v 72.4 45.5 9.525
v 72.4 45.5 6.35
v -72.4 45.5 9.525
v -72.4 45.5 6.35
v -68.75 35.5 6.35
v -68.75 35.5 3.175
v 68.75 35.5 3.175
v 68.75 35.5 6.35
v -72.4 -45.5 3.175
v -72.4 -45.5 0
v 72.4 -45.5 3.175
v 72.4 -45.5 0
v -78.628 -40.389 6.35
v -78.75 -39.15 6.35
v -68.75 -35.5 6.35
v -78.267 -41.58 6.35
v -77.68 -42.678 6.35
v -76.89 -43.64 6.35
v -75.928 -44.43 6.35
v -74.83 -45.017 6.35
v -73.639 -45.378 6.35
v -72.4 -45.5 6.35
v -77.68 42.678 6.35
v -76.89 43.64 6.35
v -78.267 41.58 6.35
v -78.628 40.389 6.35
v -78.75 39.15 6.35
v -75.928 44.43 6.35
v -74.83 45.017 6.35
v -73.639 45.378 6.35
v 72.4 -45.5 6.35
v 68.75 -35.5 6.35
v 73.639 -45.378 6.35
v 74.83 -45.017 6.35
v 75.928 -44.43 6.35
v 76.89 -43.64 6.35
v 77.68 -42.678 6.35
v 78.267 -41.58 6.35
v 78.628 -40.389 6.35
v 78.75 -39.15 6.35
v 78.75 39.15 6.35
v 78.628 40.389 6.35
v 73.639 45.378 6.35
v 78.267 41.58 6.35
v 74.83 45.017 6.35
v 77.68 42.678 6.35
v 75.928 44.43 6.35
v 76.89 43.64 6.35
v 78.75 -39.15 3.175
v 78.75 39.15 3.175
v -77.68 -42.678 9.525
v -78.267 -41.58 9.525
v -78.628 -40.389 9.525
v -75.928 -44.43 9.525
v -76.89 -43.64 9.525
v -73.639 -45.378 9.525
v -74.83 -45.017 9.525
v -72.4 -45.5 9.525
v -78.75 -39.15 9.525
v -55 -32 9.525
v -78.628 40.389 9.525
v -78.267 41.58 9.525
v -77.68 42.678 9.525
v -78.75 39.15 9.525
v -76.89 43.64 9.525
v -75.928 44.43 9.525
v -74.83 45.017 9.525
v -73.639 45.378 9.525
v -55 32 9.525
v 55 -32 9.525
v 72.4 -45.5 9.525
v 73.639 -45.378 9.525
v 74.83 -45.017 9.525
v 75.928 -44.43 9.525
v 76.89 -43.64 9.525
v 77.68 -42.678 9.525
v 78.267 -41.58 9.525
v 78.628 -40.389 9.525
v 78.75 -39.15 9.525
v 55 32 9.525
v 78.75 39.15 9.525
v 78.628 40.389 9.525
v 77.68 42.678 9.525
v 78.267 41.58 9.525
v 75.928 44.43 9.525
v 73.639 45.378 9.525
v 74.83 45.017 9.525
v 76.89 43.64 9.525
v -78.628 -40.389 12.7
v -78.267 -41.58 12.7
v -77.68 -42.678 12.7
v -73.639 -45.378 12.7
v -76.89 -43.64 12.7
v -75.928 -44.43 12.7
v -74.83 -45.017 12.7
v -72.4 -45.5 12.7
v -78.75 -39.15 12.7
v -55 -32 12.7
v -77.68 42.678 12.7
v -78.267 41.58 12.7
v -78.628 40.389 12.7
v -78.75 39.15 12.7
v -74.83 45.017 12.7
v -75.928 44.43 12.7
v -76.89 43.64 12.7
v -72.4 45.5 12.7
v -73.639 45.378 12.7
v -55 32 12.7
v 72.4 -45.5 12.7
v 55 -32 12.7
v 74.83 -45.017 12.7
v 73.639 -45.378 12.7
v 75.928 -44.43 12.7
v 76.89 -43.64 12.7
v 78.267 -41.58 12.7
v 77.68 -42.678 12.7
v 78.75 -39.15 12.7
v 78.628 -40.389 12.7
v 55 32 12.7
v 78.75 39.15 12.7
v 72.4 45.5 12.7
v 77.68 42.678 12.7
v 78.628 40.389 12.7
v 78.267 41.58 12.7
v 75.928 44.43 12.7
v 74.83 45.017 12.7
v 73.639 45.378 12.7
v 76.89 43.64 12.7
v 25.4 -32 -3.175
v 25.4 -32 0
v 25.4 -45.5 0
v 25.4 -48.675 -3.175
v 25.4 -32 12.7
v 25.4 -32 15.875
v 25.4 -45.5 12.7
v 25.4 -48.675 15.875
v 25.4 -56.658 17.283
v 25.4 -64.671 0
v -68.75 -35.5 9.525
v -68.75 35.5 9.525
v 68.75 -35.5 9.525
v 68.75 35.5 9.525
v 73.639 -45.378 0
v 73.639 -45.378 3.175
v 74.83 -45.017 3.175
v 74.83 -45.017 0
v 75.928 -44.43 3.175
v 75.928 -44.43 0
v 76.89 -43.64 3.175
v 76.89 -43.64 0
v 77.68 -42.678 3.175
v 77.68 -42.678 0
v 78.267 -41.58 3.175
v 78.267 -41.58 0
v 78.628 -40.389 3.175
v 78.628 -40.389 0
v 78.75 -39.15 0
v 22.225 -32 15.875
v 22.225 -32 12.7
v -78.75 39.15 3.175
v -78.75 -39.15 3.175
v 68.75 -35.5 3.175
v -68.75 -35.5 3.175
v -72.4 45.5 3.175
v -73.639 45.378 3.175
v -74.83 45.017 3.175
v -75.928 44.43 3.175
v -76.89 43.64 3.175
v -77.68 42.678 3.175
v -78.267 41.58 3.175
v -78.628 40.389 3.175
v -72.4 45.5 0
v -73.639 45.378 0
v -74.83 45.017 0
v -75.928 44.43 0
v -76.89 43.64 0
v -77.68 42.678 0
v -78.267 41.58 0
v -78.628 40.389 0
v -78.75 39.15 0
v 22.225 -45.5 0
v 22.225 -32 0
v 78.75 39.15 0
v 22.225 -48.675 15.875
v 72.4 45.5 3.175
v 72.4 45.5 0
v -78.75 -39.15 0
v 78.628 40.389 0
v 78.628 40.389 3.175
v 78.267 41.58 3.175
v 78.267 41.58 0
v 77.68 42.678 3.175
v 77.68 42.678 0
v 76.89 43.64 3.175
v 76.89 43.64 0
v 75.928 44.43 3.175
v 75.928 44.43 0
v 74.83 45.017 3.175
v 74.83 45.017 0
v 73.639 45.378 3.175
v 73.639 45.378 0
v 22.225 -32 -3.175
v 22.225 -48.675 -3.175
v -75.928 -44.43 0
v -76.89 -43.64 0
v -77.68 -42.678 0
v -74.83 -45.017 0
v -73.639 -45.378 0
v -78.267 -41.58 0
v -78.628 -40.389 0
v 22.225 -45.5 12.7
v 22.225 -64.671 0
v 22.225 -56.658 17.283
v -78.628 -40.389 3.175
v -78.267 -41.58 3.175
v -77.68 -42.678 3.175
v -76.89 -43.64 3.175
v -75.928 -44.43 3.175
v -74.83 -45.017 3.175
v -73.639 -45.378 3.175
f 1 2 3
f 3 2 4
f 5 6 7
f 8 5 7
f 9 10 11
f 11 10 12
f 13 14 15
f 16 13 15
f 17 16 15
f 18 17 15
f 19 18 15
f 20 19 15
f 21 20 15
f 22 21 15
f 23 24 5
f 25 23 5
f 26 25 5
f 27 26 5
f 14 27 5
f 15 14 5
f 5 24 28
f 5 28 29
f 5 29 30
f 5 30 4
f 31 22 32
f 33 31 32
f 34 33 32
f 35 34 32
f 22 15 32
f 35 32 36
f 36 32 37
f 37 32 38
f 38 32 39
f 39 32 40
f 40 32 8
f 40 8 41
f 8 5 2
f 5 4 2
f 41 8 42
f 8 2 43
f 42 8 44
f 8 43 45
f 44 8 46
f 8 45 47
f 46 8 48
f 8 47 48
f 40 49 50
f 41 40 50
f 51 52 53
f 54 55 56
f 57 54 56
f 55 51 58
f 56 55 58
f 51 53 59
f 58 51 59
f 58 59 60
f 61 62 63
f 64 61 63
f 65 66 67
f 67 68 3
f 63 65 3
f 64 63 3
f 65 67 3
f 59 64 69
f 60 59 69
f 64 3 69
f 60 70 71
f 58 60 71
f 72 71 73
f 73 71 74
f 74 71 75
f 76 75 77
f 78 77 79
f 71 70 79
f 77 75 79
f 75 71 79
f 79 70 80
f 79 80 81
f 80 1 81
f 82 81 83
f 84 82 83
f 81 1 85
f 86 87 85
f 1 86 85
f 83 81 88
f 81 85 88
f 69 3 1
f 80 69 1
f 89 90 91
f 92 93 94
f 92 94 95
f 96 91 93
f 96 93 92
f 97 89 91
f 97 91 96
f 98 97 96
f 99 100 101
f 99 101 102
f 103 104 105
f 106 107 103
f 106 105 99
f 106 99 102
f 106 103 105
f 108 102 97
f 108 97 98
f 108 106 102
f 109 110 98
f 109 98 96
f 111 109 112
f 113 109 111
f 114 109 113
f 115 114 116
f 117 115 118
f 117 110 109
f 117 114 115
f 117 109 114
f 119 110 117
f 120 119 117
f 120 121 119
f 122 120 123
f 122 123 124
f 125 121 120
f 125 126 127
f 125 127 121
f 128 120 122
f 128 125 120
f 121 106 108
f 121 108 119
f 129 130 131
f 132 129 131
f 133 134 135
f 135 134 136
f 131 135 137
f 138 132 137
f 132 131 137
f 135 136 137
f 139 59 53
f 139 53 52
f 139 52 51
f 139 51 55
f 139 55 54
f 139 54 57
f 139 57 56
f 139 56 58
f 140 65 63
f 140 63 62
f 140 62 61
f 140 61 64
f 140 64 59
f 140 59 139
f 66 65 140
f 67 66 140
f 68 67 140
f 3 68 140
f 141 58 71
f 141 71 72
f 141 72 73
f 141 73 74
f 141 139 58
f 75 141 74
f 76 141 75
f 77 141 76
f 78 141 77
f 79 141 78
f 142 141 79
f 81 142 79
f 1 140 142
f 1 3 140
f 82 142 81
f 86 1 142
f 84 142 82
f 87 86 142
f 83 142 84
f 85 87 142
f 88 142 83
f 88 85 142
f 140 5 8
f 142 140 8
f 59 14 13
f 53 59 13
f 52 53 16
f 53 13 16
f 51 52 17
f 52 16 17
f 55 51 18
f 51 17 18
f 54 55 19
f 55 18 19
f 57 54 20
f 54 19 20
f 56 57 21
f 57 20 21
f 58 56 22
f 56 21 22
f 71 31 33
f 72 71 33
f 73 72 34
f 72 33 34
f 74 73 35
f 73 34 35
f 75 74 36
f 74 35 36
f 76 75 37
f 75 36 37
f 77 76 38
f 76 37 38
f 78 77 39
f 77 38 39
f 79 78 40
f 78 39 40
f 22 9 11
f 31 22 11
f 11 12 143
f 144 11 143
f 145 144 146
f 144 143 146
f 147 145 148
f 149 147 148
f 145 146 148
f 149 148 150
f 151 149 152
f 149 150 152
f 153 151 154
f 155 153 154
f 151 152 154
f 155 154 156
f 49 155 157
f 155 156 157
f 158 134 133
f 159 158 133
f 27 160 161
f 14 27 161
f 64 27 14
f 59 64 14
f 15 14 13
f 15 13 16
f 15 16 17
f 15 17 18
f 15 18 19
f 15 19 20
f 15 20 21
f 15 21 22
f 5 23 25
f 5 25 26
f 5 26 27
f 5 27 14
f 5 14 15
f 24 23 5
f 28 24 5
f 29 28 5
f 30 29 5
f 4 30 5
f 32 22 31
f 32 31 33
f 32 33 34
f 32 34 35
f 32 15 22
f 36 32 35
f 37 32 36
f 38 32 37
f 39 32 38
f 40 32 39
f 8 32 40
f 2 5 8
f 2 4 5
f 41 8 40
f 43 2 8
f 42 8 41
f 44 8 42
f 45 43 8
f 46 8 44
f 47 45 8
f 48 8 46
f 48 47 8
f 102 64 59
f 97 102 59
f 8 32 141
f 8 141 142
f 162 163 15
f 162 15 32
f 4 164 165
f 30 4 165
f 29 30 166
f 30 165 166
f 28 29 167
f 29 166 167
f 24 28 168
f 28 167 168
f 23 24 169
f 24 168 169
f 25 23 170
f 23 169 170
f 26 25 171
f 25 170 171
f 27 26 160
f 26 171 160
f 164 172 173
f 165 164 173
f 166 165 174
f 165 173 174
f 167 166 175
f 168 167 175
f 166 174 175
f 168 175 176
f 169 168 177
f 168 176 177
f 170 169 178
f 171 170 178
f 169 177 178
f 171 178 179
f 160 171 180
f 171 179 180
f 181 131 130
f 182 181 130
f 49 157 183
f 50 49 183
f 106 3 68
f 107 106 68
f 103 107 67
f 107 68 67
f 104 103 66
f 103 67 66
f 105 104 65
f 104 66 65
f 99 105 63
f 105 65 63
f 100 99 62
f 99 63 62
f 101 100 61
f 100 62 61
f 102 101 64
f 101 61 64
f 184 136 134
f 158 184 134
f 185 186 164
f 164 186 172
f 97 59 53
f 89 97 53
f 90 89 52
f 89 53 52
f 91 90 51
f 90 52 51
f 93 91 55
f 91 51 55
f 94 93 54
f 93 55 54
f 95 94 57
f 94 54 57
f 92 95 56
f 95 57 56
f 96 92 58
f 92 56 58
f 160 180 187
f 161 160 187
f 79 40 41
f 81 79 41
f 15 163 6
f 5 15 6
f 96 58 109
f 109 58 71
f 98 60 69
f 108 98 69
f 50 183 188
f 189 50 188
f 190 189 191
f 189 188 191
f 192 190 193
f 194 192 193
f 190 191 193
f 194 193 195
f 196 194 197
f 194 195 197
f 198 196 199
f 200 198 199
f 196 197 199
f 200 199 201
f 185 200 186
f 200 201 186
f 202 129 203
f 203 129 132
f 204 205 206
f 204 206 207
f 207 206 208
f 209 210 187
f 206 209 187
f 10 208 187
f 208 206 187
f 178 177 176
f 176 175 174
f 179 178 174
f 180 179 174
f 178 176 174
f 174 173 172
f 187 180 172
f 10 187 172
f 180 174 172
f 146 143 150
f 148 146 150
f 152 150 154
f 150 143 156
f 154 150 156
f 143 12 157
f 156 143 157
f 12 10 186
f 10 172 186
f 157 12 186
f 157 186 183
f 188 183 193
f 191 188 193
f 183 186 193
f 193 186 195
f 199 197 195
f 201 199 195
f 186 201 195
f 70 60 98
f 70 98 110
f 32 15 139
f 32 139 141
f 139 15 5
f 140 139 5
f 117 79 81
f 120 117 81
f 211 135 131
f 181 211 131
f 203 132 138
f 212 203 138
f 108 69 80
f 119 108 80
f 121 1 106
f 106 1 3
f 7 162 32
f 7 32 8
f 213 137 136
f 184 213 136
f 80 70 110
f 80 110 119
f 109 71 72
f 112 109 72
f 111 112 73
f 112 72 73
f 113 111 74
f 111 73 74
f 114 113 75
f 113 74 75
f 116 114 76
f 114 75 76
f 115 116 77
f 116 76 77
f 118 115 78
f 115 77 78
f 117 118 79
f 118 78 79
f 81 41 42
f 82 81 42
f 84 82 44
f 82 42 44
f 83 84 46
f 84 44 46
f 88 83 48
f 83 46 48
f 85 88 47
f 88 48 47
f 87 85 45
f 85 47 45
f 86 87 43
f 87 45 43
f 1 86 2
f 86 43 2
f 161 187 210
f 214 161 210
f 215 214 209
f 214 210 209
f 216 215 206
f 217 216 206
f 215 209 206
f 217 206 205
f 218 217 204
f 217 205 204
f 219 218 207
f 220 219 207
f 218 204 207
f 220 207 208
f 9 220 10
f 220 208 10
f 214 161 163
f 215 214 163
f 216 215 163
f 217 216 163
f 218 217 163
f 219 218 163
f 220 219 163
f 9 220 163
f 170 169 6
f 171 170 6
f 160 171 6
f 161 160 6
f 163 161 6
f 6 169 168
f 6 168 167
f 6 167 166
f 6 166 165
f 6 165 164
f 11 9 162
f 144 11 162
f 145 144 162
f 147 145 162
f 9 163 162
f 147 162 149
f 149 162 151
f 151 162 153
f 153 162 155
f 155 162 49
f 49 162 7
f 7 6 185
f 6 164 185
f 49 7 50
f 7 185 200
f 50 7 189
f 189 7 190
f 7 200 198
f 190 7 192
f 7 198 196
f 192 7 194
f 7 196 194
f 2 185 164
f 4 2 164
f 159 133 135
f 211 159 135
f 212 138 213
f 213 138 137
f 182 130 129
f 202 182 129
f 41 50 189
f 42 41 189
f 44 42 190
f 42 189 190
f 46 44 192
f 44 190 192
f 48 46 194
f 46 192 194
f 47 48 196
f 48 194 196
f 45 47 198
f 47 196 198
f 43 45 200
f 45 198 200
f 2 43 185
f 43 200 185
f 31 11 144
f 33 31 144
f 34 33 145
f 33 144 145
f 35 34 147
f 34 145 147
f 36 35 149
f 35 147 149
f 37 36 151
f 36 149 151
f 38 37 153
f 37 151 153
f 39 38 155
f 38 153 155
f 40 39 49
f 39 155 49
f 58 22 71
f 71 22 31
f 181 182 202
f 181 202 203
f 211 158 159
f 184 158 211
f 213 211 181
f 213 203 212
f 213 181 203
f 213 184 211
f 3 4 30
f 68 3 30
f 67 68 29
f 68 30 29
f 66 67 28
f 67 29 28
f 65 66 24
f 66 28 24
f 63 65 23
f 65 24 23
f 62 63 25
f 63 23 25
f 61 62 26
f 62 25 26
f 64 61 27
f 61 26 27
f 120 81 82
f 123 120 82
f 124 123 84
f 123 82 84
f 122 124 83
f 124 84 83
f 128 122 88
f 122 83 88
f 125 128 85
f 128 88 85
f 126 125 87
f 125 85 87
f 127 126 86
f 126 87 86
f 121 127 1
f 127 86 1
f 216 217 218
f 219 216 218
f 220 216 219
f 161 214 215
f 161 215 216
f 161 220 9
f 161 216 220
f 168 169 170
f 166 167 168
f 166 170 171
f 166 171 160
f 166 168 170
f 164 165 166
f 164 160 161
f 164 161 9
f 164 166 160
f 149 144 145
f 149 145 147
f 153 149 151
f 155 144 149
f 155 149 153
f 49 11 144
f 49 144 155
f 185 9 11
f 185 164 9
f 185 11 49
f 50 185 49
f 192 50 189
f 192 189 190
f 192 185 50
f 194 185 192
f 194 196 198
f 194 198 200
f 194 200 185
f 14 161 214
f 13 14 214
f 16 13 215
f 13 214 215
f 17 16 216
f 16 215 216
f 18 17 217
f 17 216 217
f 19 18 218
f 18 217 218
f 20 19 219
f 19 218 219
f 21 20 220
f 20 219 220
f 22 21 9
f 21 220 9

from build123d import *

# Parameters (mm, degrees)
F0_W      = 110
F0_H      = 64
F1_DEPTH  = 3.175
F2_W      = 137.5
F2_H      = 71
F3_DEPTH  = 3.175
F4_W      = 137.5
F4_H      = 71
F5_DEPTH  = 3.175
F6_W      = 110
F6_H      = 64
F7_DEPTH  = 3.175
F13_DEPTH = 3.175


# Not quite as in the source:
# - a length typed as a fraction of an inch, garbled in the dataset ("3 / 203.2 mm" for 3/8 in), is restored


with BuildPart() as f1:
    # F0 (on Top) → F1 (new body)
    with BuildSketch(Plane.XY):
        with BuildLine():
            Line((0, 35.5), (68.75, 35.5))
            Line((68.75, 35.5), (68.75, 0))
            Line((68.75, 0), (78.75, 0))
            Line((78.75, 0), (78.75, 39.15))
            ThreePointArc((78.75, 39.15), (76.8901280605, 43.6401280605), (72.4, 45.5))
            Line((72.4, 45.5), (0, 45.5))
            Line((0, 45.5), (0, 35.5))
        make_face()
        with BuildLine():
            Line((-68.75, 35.5), (0, 35.5))
            Line((0, 35.5), (0, 45.5))
            Line((0, 45.5), (-72.4, 45.5))
            ThreePointArc((-72.4, 45.5), (-76.8901280605, 43.6401280605), (-78.75, 39.15))
            Line((-78.75, 39.15), (-78.75, 0))
            Line((-78.75, 0), (-68.75, 0))
            Line((-68.75, 0), (-68.75, 35.5))
        make_face()
        with BuildLine():
            Line((78.75, 0), (68.75, 0))
            Line((68.75, 0), (68.75, -35.5))
            Line((68.75, -35.5), (0, -35.5))
            Line((0, -35.5), (0, -45.5))
            Line((0, -45.5), (72.4, -45.5))
            ThreePointArc((72.4, -45.5), (76.8901280605, -43.6401280605), (78.75, -39.15))
            Line((78.75, -39.15), (78.75, 0))
        make_face()
        with BuildLine():
            Line((-68.75, -35.5), (-68.75, 0))
            Line((-68.75, 0), (-78.75, 0))
            Line((-78.75, 0), (-78.75, -39.15))
            ThreePointArc((-78.75, -39.15), (-76.8901280605, -43.6401280605), (-72.4, -45.5))
            Line((-72.4, -45.5), (0, -45.5))
            Line((0, -45.5), (0, -35.5))
            Line((0, -35.5), (-68.75, -35.5))
        make_face()
        Polygon((68.75, 0), (68.75, 35.5), (0, 35.5), (-68.75, 35.5), (-68.75, 0), (-68.75, -35.5), (0, -35.5), (68.75, -35.5), align=None)
        Rectangle(F0_W, F0_H, mode=Mode.SUBTRACT)
        Rectangle(F0_W, F0_H)
    extrude(amount=F1_DEPTH)


with BuildPart() as f3:
    # F2 (on face) → F3 (new body)
    with BuildSketch(Plane.XY.offset(3.175)):
        with BuildLine():
            Line((-72.4, -45.5), (72.4, -45.5))
            ThreePointArc((72.4, -45.5), (76.8901280605, -43.6401280605), (78.75, -39.15))
            Line((78.75, -39.15), (78.75, 39.15))
            ThreePointArc((78.75, 39.15), (76.8901280605, 43.6401280605), (72.4, 45.5))
            Line((72.4, 45.5), (-72.4, 45.5))
            ThreePointArc((-72.4, 45.5), (-76.8901280605, 43.6401280605), (-78.75, 39.15))
            Line((-78.75, 39.15), (-78.75, -39.15))
            ThreePointArc((-78.75, -39.15), (-76.8901280605, -43.6401280605), (-72.4, -45.5))
        make_face()
        Rectangle(F2_W, F2_H, mode=Mode.SUBTRACT)
    extrude(amount=F3_DEPTH)


with BuildPart() as f5:
    # F4 (on face) → F5 (new body)
    with BuildSketch(Plane.XY.offset(6.35)):
        with BuildLine():
            ThreePointArc((-78.75, -39.15), (-76.8901280605, -43.6401280605), (-72.4, -45.5))
            Line((-72.4, -45.5), (72.4, -45.5))
            ThreePointArc((72.4, -45.5), (76.8901280605, -43.6401280605), (78.75, -39.15))
            Line((78.75, -39.15), (78.75, 39.15))
            ThreePointArc((78.75, 39.15), (76.8901280605, 43.6401280605), (72.4, 45.5))
            Line((72.4, 45.5), (-72.4, 45.5))
            ThreePointArc((-72.4, 45.5), (-76.8901280605, 43.6401280605), (-78.75, 39.15))
            Line((-78.75, 39.15), (-78.75, -39.15))
        make_face()
        Rectangle(F4_W, F4_H, mode=Mode.SUBTRACT)
    extrude(amount=F5_DEPTH)


with BuildPart() as f7:
    # F6 (on face) → F7 (new body)
    with BuildSketch(Plane.XY.offset(9.525)):
        with BuildLine():
            Line((-72.4, -45.5), (72.4, -45.5))
            ThreePointArc((72.4, -45.5), (76.8901280605, -43.6401280605), (78.75, -39.15))
            Line((78.75, -39.15), (78.75, 39.15))
            ThreePointArc((78.75, 39.15), (76.8901280605, 43.6401280605), (72.4, 45.5))
            Line((72.4, 45.5), (-72.4, 45.5))
            ThreePointArc((-72.4, 45.5), (-76.8901280605, 43.6401280605), (-78.75, 39.15))
            Line((-78.75, 39.15), (-78.75, -39.15))
            ThreePointArc((-78.75, -39.15), (-76.8901280605, -43.6401280605), (-72.4, -45.5))
        make_face()
        Rectangle(F6_W, F6_H, mode=Mode.SUBTRACT)
    extrude(amount=F7_DEPTH)


with BuildPart() as f13:
    # F12 (on line) → F13 (new body)
    with BuildSketch(Plane(origin=(25.4, 0, 0), x_dir=(0, -1, 0), z_dir=(-1, 0, 0))):
        Polygon((56.6581731759, 17.2826488226), (48.675, 15.875), (48.675, -3.175), (64.6714465192, 0), align=None)
        Polygon((48.675, -3.175), (48.675, 15.875), (32, 15.875), (32, 12.7), (45.5, 12.7), (45.5, 0), (32, 0), (32, -3.175), align=None)
    extrude(amount=F13_DEPTH)


solid = Compound([f1.part, f3.part, f5.part, f7.part, f13.part])
